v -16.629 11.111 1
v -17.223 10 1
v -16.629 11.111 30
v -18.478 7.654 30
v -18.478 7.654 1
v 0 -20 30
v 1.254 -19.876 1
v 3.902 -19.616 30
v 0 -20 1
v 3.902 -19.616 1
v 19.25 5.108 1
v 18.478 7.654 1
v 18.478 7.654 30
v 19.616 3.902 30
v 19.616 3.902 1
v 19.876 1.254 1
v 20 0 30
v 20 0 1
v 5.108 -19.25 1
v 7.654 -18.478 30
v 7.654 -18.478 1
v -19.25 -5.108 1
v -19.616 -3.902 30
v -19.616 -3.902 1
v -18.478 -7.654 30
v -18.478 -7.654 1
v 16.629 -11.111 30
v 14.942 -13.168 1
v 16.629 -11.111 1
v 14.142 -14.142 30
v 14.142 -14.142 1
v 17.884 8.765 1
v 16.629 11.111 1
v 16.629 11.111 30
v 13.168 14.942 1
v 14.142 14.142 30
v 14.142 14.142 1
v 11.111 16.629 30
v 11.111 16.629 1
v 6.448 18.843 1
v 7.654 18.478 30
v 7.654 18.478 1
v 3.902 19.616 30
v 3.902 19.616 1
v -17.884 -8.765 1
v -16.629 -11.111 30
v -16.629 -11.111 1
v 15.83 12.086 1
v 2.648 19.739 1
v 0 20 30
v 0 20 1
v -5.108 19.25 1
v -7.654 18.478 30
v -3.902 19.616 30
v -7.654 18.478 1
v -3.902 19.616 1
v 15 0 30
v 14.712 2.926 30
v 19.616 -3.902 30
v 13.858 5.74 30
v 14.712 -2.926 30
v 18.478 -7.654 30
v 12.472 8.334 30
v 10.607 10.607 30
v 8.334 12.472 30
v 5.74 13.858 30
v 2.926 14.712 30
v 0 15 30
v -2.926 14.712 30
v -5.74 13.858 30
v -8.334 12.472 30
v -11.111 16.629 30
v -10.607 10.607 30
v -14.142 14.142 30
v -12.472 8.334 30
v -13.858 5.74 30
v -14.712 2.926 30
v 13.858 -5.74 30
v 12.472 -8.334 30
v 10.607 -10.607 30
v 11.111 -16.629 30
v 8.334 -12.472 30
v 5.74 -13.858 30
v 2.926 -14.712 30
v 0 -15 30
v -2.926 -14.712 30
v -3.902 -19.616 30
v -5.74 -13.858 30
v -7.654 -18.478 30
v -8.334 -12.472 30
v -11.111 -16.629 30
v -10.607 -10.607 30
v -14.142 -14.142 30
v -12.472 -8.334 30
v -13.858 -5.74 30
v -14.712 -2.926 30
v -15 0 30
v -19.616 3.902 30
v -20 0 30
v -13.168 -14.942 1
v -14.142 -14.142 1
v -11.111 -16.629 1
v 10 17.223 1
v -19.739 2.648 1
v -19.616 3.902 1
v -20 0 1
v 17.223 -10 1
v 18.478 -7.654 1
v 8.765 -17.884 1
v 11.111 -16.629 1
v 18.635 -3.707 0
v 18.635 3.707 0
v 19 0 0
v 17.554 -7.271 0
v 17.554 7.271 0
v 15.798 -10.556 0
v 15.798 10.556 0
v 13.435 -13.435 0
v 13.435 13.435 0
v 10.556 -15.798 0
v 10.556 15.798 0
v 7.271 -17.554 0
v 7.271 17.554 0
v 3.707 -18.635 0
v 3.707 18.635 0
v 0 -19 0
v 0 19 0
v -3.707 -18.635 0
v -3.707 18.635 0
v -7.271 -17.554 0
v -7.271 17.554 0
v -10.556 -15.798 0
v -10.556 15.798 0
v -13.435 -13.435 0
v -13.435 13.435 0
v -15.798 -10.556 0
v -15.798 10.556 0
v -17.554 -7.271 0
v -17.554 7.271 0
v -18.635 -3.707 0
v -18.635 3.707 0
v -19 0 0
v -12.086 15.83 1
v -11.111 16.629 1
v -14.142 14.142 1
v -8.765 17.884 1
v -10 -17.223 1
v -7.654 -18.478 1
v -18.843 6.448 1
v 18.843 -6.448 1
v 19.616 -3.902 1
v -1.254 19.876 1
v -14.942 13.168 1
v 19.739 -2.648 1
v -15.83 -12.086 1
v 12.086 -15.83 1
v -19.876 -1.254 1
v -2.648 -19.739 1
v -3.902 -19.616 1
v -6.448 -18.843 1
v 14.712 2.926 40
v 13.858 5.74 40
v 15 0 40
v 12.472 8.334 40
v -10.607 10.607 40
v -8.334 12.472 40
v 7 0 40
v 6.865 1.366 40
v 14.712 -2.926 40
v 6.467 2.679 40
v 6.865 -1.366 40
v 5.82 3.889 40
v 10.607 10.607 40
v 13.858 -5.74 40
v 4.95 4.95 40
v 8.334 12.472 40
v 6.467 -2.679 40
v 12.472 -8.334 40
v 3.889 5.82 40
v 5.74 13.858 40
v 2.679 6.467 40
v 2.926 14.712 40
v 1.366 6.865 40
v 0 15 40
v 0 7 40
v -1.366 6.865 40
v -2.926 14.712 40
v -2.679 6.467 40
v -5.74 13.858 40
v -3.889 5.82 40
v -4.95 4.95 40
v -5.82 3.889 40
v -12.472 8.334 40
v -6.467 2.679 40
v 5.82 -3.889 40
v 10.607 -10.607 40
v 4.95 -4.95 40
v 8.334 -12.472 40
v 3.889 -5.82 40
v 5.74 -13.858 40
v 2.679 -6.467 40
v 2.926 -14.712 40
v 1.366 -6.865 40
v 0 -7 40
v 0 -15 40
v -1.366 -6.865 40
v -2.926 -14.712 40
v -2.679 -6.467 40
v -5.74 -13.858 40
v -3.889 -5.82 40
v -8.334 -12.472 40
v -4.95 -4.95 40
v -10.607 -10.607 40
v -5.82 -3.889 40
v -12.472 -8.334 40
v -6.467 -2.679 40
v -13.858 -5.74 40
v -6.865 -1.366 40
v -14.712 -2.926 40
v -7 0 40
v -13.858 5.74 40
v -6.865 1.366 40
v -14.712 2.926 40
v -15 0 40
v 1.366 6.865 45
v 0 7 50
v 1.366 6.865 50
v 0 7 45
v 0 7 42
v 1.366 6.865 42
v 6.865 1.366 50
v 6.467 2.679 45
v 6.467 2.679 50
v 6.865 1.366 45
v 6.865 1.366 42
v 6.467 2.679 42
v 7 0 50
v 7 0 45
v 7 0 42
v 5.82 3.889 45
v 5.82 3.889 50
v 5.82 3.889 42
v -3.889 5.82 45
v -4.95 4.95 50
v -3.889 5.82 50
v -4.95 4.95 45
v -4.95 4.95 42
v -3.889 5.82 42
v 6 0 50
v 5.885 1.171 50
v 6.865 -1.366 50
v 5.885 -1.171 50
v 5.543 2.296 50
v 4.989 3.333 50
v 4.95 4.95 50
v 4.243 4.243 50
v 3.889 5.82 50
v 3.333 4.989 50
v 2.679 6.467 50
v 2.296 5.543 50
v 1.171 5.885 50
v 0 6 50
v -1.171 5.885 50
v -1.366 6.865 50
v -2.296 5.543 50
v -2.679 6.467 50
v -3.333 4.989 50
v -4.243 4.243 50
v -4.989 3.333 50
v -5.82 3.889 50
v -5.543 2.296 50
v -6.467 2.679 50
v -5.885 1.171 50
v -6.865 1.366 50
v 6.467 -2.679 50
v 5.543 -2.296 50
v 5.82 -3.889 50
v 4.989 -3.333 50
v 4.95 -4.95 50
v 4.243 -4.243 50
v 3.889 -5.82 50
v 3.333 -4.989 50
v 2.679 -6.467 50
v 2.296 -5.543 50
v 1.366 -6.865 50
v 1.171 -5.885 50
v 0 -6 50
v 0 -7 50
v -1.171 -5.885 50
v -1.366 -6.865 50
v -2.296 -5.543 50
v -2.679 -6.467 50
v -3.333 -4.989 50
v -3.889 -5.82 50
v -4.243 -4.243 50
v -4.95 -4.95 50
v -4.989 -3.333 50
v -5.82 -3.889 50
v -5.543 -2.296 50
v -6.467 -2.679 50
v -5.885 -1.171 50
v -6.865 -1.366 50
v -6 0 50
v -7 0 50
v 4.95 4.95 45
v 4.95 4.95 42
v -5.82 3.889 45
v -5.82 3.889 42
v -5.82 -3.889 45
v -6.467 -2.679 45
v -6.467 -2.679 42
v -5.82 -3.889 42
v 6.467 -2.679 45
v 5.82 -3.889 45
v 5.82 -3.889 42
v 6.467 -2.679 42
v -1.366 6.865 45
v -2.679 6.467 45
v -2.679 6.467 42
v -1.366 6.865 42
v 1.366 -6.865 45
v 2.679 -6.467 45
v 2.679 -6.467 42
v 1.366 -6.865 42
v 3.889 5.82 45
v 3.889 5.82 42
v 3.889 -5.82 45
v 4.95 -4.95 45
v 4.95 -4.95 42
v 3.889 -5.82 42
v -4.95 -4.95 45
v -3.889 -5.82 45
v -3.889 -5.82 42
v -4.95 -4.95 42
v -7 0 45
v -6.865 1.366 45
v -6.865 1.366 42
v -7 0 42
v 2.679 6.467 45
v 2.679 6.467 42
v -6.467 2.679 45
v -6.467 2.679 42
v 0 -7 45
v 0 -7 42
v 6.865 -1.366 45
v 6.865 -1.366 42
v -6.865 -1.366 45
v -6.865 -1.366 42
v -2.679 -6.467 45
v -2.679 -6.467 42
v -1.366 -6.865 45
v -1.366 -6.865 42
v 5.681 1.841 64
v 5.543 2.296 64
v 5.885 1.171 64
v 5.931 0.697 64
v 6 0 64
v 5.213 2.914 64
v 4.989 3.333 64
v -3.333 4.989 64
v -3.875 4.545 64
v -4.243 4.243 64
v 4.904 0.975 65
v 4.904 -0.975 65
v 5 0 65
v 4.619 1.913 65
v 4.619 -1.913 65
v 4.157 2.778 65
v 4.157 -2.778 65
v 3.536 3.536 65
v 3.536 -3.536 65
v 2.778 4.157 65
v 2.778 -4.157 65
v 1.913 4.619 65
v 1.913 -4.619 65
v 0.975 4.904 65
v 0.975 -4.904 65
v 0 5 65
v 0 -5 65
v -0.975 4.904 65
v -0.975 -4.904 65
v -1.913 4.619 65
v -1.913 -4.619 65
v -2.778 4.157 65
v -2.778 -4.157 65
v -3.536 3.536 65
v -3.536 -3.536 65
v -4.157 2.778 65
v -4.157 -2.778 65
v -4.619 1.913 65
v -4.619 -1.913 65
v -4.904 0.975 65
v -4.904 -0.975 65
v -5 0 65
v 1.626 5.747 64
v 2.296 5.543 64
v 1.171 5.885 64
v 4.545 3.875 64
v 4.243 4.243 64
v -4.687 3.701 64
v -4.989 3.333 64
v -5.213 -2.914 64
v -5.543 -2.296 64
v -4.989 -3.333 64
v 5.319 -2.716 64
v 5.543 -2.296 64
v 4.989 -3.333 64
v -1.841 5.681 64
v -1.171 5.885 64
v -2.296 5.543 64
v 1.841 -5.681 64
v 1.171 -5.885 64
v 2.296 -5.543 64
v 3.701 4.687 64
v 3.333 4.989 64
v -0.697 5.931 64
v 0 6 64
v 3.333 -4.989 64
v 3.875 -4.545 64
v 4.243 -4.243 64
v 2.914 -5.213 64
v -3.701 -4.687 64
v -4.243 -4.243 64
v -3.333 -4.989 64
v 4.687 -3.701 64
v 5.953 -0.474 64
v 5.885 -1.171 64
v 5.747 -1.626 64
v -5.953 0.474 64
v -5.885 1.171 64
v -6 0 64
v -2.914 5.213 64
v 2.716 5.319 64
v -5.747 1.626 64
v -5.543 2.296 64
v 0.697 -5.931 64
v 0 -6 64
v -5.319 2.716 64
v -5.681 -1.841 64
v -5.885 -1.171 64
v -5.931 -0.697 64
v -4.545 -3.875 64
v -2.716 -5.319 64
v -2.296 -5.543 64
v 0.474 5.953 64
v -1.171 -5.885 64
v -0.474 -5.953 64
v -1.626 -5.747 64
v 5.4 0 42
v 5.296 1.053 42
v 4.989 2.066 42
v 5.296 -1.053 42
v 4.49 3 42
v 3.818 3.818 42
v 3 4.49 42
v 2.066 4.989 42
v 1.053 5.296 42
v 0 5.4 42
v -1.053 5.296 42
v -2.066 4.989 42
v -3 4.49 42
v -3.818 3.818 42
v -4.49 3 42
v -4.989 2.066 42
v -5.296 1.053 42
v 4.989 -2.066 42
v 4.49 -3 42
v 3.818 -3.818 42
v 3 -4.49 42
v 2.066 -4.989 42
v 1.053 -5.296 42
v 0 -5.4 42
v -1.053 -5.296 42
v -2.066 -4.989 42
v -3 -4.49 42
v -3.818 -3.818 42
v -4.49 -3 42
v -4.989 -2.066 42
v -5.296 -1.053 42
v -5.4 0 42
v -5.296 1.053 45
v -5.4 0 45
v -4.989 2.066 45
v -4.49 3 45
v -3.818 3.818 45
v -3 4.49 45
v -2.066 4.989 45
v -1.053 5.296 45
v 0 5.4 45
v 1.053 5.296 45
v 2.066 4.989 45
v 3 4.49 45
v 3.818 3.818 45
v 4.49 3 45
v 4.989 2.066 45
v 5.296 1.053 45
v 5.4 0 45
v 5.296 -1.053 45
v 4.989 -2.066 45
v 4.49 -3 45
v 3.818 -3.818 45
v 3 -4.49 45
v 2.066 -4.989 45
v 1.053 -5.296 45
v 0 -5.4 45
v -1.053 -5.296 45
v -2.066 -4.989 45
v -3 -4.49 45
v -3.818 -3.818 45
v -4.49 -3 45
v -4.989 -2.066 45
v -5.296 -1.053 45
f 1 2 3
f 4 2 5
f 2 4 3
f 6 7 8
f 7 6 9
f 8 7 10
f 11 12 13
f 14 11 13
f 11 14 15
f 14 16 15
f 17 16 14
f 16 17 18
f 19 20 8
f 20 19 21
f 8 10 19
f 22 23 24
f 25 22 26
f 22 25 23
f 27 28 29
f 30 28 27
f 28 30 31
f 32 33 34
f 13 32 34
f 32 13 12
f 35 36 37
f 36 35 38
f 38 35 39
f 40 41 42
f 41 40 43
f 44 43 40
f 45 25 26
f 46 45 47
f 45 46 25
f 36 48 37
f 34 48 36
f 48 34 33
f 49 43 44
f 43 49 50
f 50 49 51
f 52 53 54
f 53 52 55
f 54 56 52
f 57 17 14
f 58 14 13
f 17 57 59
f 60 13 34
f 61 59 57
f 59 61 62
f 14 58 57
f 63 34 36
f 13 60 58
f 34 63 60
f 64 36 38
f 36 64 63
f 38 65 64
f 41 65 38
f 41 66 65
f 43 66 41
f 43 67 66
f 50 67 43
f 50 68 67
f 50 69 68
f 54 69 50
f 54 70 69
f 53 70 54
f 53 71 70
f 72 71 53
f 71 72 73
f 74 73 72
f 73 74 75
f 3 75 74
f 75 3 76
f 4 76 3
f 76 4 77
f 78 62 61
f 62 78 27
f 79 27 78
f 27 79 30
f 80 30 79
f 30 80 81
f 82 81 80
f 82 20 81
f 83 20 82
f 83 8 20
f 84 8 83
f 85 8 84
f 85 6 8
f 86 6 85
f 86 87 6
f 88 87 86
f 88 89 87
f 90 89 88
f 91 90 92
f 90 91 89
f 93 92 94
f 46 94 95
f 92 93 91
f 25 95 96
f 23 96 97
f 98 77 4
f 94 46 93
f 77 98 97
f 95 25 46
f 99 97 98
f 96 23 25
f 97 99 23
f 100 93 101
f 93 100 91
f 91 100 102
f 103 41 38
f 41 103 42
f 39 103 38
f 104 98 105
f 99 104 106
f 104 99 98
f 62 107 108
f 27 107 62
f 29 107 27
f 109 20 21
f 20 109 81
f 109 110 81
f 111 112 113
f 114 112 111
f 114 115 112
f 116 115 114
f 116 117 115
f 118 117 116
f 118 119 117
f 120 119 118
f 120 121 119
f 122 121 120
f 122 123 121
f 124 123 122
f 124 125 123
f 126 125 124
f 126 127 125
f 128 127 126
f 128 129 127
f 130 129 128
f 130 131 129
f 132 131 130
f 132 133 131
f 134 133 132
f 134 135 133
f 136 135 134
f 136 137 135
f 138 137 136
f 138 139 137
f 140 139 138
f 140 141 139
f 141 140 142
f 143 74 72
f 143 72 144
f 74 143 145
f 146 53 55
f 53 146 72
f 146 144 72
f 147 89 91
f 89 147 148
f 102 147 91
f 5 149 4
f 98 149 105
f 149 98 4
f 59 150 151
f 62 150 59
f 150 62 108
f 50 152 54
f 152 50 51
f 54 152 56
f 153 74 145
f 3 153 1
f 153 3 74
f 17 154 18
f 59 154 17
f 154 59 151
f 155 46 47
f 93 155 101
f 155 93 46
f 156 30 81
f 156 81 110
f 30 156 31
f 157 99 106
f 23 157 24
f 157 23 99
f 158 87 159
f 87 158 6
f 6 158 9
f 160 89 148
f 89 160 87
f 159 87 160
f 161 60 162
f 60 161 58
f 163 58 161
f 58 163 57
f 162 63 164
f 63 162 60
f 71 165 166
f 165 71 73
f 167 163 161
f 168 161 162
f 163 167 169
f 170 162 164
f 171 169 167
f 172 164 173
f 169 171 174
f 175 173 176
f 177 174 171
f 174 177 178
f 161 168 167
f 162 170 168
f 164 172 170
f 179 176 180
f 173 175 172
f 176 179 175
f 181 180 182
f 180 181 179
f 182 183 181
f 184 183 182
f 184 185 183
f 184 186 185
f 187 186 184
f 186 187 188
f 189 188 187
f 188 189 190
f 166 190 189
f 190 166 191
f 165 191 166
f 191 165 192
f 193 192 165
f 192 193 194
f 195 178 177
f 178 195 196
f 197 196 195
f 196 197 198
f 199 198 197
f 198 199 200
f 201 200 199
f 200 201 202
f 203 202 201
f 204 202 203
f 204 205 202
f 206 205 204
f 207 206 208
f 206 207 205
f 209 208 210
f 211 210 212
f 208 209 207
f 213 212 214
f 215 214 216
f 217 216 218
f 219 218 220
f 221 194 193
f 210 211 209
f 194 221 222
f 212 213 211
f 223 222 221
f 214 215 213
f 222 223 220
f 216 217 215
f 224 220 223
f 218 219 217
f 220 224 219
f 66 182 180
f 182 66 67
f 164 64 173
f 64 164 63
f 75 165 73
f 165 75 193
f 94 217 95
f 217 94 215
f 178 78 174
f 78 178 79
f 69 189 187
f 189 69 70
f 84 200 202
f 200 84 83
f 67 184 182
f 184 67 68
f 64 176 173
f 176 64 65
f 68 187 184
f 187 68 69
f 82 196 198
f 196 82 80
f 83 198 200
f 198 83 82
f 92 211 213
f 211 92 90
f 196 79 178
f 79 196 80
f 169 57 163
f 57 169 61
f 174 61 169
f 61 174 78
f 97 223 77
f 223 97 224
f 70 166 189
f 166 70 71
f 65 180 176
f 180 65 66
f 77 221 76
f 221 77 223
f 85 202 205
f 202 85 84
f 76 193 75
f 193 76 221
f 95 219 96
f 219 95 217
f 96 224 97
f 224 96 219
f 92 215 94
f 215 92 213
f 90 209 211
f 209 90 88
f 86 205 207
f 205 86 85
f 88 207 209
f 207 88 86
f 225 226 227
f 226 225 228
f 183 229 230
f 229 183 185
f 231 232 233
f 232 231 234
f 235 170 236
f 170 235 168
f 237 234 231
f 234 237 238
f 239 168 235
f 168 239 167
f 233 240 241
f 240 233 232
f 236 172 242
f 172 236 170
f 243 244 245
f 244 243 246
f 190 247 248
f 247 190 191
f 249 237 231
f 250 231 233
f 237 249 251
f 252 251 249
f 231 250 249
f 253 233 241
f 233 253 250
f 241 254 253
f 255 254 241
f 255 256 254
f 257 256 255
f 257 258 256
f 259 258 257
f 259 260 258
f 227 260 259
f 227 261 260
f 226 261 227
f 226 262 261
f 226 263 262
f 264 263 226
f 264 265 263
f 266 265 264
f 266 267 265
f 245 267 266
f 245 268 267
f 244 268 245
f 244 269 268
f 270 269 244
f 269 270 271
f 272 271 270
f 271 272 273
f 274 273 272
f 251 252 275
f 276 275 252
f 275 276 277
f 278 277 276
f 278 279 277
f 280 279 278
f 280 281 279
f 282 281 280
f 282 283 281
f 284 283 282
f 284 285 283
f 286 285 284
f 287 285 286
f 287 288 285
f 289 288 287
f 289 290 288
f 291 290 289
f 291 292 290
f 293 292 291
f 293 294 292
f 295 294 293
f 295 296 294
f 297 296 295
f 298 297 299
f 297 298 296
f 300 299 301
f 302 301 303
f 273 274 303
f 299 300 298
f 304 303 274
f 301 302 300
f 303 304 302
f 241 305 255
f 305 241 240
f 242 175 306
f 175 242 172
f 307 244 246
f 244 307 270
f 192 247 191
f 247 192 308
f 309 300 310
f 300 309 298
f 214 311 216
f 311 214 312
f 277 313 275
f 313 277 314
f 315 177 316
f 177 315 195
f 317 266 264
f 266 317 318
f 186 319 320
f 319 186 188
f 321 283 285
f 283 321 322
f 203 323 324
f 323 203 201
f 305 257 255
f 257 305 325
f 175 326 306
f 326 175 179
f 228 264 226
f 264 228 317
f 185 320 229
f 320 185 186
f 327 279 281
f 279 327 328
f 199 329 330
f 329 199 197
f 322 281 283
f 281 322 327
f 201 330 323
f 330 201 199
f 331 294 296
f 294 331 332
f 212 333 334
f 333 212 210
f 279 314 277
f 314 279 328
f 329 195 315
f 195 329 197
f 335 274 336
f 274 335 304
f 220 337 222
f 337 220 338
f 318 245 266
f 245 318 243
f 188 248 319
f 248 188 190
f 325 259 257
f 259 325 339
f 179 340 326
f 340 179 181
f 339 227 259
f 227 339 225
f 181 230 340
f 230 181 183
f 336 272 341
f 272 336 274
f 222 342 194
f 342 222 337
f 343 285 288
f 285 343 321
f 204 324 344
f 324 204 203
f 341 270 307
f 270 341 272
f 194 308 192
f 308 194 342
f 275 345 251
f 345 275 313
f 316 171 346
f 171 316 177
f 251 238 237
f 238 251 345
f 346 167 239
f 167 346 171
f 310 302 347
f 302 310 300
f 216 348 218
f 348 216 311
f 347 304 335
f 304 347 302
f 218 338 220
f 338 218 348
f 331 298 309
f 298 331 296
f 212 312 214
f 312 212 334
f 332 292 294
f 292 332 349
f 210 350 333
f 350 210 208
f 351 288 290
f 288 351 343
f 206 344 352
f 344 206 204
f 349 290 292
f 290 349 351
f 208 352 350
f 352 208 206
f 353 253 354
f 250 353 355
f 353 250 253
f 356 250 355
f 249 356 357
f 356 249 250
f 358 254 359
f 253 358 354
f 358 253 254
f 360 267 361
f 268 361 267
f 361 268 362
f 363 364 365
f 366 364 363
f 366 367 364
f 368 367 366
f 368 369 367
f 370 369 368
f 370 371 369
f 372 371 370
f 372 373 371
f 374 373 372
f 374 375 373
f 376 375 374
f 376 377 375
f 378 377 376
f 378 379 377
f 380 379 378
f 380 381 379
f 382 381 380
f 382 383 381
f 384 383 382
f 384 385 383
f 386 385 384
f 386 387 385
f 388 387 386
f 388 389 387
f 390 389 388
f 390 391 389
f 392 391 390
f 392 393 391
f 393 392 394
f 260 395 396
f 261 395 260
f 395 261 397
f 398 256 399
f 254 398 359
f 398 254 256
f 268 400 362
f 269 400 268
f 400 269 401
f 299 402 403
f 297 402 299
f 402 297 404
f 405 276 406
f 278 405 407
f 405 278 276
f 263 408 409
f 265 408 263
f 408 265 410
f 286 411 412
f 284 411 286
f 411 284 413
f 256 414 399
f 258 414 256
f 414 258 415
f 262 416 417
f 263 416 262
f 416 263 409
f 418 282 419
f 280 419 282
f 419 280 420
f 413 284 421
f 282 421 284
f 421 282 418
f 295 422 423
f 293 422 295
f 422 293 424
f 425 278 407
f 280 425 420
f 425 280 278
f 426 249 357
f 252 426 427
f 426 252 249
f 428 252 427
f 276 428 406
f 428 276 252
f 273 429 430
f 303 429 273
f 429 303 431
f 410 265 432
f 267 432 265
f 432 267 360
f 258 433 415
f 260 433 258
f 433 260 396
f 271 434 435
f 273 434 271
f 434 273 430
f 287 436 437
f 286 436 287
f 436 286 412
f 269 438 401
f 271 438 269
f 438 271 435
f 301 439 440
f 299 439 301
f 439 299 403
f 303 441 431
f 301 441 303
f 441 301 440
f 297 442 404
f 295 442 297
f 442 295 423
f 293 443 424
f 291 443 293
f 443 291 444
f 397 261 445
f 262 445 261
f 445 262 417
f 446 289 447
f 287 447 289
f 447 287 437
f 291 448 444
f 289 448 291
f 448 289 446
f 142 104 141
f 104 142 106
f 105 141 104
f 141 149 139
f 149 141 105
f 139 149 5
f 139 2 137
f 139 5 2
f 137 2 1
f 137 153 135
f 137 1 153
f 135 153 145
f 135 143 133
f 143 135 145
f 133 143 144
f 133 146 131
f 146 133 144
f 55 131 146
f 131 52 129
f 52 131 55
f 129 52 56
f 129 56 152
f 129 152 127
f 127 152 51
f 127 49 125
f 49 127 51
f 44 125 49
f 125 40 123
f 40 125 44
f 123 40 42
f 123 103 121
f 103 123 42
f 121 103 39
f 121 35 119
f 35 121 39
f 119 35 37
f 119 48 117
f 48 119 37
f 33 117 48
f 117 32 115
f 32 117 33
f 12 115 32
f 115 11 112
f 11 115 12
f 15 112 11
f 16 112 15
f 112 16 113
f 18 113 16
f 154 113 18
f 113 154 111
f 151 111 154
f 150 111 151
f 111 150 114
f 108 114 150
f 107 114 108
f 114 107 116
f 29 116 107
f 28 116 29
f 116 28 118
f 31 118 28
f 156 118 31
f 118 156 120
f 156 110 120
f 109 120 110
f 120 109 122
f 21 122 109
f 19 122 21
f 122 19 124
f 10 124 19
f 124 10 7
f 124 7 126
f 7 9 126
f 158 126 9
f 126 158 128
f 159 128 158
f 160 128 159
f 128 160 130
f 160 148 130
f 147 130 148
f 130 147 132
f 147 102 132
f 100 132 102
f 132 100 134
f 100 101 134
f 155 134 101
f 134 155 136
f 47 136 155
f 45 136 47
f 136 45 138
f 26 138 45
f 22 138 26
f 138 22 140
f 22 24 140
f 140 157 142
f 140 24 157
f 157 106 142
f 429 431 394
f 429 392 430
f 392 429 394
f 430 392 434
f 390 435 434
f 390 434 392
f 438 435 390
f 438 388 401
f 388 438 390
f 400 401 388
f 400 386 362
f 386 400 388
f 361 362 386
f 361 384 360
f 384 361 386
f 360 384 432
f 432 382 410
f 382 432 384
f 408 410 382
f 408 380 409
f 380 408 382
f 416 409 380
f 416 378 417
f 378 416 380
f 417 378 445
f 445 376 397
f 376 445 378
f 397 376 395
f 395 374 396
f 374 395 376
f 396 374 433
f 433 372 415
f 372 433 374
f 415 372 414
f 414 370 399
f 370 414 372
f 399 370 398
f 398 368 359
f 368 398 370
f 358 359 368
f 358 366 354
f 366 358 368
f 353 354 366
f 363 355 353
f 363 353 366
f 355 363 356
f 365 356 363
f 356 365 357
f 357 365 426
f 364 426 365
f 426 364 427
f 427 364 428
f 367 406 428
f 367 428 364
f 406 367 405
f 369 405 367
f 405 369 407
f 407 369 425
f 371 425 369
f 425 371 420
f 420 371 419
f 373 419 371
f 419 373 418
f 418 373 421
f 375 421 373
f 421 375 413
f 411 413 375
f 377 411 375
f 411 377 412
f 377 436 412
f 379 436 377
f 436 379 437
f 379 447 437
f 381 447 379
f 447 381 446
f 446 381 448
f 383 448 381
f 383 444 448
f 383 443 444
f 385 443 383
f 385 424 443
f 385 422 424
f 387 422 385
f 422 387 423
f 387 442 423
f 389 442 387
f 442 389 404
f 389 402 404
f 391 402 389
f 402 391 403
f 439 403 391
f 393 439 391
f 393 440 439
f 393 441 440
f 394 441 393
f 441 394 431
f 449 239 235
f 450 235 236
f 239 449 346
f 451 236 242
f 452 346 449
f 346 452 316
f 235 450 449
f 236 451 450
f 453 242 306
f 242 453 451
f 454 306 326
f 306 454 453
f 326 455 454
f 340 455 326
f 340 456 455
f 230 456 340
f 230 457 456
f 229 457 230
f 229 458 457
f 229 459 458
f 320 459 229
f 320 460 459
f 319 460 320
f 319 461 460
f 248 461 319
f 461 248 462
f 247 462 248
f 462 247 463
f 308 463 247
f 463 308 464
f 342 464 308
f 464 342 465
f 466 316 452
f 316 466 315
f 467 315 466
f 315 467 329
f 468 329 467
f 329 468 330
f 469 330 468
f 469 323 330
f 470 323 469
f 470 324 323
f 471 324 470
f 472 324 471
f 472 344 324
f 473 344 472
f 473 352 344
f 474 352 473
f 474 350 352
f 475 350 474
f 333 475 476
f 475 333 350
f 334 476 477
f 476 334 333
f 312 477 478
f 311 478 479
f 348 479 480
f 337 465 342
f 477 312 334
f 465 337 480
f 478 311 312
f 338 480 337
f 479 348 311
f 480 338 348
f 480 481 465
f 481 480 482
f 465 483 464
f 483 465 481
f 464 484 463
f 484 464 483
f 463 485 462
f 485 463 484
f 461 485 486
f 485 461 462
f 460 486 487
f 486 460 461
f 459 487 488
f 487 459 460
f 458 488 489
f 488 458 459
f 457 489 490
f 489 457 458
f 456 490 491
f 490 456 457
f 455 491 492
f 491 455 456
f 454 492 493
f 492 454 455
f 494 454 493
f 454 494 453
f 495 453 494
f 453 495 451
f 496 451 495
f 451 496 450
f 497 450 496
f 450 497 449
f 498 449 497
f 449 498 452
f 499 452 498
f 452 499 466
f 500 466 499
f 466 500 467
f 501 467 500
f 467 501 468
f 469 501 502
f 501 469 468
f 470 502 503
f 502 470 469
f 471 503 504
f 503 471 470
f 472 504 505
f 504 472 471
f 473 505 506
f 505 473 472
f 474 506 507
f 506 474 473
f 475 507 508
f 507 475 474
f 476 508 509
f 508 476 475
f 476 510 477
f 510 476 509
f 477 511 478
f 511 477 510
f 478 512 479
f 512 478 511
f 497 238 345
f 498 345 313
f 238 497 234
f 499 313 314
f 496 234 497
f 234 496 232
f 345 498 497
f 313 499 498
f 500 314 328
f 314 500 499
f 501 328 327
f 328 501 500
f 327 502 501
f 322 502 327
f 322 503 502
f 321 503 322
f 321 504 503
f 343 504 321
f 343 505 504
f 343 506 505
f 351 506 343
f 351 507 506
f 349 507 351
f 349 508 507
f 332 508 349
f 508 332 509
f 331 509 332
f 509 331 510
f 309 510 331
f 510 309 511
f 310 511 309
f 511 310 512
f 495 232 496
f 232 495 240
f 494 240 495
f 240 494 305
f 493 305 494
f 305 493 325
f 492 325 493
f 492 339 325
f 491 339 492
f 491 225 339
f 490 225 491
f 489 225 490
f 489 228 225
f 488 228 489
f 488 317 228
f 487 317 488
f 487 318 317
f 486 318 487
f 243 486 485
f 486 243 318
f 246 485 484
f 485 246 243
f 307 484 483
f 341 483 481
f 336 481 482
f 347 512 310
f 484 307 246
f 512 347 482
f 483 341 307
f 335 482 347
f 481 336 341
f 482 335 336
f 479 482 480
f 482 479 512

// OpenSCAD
$fn = 32;

// ----------------------------------------------------------------------
// Stepped shaft: diameters 40, 30, 14, 12 mm, 65 mm long
// ----------------------------------------------------------------------

// --- parameters (mm) ---
d1 = 40;                  // step 1 diameter
len1 = 30;                // step 1 length
d2 = 30;                  // step 2 diameter
len2 = 10;                // step 2 length
d3 = 14;                  // step 3 diameter
len3 = 10;                // step 3 length
d4 = 12;                  // step 4 diameter
len4 = 15;                // step 4 length
total = 65;               // overall length
chamfer = 1;              // end chamfer
groove_r = 7;             // groove radius
groove_z = 42;            // groove position from the end
groove_w = 3;             // groove width
groove_d = 1.6;           // groove depth

difference() {
  /* turned body: stacked cylinders, every step sunk into the bigger one */
  union() {
    cylinder(h = len1, d = d1);
    translate([0, 0, 29.6]) cylinder(h = 10.4, d = d2);
    translate([0, 0, 39.6]) cylinder(h = 10.4, d = d3);
    translate([0, 0, 49.6]) cylinder(h = 15.4, d = d4);
  }
  /* bottom chamfer ring cut */
  rotate_extrude() translate([19, -2.5]) polygon([[0, 0], [3.5, 0], [3.5, 6], [0, 2.5]]);
  /* top chamfer ring cut */
  rotate_extrude() translate([5, 65]) polygon([[0, 0], [3.5, -3.5], [3.5, 2.5], [0, 2.5]]);
  /* circlip groove just behind the shoulder */
  rotate_extrude() translate([groove_r - groove_d, groove_z]) square([groove_d + 2.5, groove_w]);
}
